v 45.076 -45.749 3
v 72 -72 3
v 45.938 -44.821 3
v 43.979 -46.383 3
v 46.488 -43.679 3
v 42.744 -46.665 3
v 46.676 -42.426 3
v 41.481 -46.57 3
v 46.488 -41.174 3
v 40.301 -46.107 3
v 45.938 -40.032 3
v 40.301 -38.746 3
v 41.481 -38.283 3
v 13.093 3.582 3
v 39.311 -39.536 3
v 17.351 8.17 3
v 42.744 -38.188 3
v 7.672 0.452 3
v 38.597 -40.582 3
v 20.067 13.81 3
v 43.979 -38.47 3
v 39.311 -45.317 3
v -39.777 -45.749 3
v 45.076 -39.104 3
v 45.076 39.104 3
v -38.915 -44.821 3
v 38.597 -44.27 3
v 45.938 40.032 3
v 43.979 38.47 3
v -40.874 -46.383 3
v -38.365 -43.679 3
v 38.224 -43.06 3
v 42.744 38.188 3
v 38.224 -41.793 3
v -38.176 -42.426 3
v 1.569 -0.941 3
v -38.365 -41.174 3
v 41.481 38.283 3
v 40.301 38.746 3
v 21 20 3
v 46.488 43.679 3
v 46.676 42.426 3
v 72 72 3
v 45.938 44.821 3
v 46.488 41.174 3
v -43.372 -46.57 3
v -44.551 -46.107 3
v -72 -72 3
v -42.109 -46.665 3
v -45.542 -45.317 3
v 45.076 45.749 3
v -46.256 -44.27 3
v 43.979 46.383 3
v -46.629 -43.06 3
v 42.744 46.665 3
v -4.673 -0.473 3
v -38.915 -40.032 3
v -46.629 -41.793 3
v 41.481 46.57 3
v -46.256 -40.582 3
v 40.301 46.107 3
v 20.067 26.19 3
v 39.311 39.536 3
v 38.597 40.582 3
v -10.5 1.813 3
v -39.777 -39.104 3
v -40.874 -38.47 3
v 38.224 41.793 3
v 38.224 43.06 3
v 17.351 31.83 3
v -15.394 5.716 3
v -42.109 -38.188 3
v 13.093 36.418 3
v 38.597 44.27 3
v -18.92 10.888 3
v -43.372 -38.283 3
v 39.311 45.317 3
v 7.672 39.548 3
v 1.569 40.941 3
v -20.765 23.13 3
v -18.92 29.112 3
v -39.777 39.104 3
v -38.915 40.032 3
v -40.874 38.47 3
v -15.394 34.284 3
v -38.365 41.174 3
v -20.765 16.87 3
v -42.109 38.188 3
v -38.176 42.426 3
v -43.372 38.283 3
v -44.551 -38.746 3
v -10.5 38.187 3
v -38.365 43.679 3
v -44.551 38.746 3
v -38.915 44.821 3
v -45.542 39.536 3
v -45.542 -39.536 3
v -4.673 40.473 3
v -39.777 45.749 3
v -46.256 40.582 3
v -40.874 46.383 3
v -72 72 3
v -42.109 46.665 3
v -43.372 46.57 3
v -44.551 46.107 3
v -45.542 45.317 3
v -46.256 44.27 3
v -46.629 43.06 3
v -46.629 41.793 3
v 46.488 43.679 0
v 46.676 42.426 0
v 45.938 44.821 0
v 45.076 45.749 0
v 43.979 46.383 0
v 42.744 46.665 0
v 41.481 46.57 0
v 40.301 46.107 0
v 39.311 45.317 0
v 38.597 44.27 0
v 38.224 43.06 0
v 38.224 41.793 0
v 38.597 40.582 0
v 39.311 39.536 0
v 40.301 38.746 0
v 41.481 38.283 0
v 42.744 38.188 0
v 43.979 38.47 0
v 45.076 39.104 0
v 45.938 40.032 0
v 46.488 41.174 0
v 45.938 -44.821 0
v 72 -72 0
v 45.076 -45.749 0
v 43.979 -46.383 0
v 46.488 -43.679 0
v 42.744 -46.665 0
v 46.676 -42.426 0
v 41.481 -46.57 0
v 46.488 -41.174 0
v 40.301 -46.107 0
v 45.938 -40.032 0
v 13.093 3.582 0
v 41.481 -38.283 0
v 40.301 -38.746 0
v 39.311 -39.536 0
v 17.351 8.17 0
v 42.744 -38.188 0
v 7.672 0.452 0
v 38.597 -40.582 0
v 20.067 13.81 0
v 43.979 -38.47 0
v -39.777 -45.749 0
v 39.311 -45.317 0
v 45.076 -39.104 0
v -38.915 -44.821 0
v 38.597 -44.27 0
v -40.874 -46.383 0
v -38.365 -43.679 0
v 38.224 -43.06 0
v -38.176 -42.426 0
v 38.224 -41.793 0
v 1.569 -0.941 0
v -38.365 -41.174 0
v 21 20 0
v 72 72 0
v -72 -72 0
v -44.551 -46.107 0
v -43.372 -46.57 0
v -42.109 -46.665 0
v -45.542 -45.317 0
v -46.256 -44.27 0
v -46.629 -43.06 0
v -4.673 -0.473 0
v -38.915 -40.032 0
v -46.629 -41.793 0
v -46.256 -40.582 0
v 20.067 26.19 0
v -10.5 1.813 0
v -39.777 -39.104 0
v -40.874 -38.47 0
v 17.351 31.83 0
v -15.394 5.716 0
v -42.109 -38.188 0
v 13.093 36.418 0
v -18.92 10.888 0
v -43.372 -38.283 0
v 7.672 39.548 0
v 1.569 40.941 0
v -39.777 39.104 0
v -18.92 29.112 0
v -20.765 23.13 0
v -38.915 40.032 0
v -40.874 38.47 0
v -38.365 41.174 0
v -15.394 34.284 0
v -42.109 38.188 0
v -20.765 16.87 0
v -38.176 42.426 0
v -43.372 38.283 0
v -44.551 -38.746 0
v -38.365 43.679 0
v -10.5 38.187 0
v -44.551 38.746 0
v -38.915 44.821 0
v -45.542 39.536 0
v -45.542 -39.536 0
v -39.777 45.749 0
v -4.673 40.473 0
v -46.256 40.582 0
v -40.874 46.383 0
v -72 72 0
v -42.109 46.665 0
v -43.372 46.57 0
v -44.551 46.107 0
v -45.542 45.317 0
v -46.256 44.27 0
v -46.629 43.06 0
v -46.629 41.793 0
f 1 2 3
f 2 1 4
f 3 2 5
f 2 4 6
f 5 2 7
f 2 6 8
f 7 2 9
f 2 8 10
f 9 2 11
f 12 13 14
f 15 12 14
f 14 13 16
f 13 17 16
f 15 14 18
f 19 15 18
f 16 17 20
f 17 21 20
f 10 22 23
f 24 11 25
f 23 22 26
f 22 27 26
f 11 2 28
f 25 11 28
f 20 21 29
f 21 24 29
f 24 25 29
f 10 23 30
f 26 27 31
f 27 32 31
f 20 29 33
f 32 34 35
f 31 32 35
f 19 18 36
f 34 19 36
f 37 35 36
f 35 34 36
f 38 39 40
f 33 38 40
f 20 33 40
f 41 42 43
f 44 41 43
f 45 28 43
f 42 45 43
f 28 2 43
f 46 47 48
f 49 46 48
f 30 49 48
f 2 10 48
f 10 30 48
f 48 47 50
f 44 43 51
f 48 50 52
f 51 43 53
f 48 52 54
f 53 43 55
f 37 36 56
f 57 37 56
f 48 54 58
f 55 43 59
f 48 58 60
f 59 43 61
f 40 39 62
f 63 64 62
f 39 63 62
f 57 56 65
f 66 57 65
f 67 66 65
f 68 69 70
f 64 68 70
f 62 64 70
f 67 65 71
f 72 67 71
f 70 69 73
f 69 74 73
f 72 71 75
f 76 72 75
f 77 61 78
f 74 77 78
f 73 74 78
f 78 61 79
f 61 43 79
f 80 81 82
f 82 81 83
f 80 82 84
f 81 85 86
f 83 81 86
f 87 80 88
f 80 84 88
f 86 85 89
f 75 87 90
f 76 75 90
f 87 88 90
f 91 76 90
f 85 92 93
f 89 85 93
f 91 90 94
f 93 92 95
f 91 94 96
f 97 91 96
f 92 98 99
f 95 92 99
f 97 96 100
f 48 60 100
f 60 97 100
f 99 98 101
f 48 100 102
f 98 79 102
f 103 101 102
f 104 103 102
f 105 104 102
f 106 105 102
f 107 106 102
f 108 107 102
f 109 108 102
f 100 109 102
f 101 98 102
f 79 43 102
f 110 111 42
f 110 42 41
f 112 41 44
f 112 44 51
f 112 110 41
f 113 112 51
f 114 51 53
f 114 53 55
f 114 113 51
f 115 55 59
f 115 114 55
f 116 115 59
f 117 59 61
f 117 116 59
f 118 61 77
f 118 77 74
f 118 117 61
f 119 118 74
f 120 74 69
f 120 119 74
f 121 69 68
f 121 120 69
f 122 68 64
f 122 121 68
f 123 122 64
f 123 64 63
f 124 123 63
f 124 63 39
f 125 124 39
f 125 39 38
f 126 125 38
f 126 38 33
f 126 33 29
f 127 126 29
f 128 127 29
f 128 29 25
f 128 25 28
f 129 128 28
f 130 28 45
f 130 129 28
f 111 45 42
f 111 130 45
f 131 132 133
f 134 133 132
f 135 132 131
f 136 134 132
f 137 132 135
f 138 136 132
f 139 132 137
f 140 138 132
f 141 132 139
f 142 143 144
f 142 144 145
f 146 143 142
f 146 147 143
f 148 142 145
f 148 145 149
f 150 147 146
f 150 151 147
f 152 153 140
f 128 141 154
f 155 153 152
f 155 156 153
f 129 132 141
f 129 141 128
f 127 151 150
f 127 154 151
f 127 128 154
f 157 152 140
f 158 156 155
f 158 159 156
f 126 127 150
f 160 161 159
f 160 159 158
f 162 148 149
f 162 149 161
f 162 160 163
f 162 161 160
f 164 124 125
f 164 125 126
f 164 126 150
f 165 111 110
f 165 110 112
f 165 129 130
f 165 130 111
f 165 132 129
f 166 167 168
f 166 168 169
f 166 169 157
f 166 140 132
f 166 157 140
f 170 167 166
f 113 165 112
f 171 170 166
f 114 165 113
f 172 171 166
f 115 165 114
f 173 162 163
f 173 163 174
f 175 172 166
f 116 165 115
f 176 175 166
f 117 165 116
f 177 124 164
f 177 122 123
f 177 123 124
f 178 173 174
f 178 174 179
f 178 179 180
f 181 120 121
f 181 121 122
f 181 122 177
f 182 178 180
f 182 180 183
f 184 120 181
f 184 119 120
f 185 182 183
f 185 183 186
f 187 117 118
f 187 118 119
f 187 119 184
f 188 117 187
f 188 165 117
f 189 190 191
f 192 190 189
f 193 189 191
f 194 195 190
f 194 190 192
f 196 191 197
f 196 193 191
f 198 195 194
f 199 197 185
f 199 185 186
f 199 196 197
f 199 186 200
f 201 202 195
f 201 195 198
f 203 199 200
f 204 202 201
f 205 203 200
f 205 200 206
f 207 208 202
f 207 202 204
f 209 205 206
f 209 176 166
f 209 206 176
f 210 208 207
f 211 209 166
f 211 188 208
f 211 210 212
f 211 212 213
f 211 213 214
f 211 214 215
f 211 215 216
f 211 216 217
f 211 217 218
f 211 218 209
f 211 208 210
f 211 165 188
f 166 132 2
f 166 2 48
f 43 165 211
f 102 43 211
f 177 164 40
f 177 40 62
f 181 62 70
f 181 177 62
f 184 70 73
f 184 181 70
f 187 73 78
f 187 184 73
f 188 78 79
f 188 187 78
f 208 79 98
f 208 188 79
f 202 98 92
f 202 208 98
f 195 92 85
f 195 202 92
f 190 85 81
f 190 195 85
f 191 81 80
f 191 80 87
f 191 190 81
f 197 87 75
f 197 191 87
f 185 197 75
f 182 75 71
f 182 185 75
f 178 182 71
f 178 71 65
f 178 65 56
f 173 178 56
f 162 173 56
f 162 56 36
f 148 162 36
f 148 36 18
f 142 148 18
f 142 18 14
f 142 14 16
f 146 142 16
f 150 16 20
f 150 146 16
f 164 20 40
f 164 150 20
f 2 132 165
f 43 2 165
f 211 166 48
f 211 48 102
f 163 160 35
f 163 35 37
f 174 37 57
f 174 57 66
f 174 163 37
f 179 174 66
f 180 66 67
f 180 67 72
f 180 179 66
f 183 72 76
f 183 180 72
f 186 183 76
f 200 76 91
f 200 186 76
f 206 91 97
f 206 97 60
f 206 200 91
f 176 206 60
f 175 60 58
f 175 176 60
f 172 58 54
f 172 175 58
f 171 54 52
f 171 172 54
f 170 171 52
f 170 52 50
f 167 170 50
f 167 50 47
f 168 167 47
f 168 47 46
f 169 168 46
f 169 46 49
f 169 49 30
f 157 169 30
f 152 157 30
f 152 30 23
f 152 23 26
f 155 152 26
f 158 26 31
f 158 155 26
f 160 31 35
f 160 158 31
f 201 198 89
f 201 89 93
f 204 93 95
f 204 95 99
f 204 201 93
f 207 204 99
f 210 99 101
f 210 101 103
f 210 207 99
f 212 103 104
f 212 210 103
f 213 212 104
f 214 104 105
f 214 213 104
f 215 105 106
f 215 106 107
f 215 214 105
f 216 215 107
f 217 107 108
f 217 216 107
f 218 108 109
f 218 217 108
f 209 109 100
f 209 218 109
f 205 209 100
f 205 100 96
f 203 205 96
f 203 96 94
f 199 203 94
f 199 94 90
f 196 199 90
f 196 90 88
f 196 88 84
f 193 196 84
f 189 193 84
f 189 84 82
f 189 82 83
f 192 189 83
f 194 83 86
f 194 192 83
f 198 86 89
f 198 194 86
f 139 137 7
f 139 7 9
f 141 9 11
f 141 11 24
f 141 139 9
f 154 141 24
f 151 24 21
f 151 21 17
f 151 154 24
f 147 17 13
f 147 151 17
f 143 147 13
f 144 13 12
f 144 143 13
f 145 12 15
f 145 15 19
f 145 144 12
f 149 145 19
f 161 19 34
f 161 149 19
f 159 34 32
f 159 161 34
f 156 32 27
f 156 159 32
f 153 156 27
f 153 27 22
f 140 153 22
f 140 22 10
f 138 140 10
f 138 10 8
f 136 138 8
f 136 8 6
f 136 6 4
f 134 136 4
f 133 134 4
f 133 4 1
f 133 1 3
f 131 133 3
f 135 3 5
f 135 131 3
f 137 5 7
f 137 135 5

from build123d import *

# Parameters (mm, degrees)
SKETCH1_W           = 104
SKETCH1_H           = 104
SKETCH1_R           = 21
SKETCH1_R_2         = 4.25
BOSS_EXTRUDE1_DEPTH = 3
SKETCH2_W           = 144
SKETCH2_H           = 144
SKETCH2_W_2         = 104
SKETCH2_H_2         = 104
BOSS_EXTRUDE2_DEPTH = 3


with BuildPart() as part:
    # Sketch1 → Boss-Extrude1 (new body)
    with BuildSketch(Plane.XY):
        Rectangle(SKETCH1_W, SKETCH1_H)
        with Locations((0, 20)):
            Circle(SKETCH1_R, mode=Mode.SUBTRACT)
        with Locations((-42.426406871, 42.426406871)):
            Circle(SKETCH1_R_2, mode=Mode.SUBTRACT)
        with Locations((42.426406871, 42.426406871)):
            Circle(SKETCH1_R_2, mode=Mode.SUBTRACT)
        with Locations((42.426406871, -42.426406871)):
            Circle(SKETCH1_R_2, mode=Mode.SUBTRACT)
        with Locations((-42.426406871, -42.426406871)):
            Circle(SKETCH1_R_2, mode=Mode.SUBTRACT)
    extrude(amount=BOSS_EXTRUDE1_DEPTH)

    # Sketch2 → Boss-Extrude2 (add)
    with BuildSketch(Plane(origin=(0, 0, 0), x_dir=(-1, 0, 0), z_dir=(0, 0, -1))):
        Rectangle(SKETCH2_W, SKETCH2_H)
        Rectangle(SKETCH2_W_2, SKETCH2_H_2, mode=Mode.SUBTRACT)
    extrude(amount=-BOSS_EXTRUDE2_DEPTH)


solid = part.part
